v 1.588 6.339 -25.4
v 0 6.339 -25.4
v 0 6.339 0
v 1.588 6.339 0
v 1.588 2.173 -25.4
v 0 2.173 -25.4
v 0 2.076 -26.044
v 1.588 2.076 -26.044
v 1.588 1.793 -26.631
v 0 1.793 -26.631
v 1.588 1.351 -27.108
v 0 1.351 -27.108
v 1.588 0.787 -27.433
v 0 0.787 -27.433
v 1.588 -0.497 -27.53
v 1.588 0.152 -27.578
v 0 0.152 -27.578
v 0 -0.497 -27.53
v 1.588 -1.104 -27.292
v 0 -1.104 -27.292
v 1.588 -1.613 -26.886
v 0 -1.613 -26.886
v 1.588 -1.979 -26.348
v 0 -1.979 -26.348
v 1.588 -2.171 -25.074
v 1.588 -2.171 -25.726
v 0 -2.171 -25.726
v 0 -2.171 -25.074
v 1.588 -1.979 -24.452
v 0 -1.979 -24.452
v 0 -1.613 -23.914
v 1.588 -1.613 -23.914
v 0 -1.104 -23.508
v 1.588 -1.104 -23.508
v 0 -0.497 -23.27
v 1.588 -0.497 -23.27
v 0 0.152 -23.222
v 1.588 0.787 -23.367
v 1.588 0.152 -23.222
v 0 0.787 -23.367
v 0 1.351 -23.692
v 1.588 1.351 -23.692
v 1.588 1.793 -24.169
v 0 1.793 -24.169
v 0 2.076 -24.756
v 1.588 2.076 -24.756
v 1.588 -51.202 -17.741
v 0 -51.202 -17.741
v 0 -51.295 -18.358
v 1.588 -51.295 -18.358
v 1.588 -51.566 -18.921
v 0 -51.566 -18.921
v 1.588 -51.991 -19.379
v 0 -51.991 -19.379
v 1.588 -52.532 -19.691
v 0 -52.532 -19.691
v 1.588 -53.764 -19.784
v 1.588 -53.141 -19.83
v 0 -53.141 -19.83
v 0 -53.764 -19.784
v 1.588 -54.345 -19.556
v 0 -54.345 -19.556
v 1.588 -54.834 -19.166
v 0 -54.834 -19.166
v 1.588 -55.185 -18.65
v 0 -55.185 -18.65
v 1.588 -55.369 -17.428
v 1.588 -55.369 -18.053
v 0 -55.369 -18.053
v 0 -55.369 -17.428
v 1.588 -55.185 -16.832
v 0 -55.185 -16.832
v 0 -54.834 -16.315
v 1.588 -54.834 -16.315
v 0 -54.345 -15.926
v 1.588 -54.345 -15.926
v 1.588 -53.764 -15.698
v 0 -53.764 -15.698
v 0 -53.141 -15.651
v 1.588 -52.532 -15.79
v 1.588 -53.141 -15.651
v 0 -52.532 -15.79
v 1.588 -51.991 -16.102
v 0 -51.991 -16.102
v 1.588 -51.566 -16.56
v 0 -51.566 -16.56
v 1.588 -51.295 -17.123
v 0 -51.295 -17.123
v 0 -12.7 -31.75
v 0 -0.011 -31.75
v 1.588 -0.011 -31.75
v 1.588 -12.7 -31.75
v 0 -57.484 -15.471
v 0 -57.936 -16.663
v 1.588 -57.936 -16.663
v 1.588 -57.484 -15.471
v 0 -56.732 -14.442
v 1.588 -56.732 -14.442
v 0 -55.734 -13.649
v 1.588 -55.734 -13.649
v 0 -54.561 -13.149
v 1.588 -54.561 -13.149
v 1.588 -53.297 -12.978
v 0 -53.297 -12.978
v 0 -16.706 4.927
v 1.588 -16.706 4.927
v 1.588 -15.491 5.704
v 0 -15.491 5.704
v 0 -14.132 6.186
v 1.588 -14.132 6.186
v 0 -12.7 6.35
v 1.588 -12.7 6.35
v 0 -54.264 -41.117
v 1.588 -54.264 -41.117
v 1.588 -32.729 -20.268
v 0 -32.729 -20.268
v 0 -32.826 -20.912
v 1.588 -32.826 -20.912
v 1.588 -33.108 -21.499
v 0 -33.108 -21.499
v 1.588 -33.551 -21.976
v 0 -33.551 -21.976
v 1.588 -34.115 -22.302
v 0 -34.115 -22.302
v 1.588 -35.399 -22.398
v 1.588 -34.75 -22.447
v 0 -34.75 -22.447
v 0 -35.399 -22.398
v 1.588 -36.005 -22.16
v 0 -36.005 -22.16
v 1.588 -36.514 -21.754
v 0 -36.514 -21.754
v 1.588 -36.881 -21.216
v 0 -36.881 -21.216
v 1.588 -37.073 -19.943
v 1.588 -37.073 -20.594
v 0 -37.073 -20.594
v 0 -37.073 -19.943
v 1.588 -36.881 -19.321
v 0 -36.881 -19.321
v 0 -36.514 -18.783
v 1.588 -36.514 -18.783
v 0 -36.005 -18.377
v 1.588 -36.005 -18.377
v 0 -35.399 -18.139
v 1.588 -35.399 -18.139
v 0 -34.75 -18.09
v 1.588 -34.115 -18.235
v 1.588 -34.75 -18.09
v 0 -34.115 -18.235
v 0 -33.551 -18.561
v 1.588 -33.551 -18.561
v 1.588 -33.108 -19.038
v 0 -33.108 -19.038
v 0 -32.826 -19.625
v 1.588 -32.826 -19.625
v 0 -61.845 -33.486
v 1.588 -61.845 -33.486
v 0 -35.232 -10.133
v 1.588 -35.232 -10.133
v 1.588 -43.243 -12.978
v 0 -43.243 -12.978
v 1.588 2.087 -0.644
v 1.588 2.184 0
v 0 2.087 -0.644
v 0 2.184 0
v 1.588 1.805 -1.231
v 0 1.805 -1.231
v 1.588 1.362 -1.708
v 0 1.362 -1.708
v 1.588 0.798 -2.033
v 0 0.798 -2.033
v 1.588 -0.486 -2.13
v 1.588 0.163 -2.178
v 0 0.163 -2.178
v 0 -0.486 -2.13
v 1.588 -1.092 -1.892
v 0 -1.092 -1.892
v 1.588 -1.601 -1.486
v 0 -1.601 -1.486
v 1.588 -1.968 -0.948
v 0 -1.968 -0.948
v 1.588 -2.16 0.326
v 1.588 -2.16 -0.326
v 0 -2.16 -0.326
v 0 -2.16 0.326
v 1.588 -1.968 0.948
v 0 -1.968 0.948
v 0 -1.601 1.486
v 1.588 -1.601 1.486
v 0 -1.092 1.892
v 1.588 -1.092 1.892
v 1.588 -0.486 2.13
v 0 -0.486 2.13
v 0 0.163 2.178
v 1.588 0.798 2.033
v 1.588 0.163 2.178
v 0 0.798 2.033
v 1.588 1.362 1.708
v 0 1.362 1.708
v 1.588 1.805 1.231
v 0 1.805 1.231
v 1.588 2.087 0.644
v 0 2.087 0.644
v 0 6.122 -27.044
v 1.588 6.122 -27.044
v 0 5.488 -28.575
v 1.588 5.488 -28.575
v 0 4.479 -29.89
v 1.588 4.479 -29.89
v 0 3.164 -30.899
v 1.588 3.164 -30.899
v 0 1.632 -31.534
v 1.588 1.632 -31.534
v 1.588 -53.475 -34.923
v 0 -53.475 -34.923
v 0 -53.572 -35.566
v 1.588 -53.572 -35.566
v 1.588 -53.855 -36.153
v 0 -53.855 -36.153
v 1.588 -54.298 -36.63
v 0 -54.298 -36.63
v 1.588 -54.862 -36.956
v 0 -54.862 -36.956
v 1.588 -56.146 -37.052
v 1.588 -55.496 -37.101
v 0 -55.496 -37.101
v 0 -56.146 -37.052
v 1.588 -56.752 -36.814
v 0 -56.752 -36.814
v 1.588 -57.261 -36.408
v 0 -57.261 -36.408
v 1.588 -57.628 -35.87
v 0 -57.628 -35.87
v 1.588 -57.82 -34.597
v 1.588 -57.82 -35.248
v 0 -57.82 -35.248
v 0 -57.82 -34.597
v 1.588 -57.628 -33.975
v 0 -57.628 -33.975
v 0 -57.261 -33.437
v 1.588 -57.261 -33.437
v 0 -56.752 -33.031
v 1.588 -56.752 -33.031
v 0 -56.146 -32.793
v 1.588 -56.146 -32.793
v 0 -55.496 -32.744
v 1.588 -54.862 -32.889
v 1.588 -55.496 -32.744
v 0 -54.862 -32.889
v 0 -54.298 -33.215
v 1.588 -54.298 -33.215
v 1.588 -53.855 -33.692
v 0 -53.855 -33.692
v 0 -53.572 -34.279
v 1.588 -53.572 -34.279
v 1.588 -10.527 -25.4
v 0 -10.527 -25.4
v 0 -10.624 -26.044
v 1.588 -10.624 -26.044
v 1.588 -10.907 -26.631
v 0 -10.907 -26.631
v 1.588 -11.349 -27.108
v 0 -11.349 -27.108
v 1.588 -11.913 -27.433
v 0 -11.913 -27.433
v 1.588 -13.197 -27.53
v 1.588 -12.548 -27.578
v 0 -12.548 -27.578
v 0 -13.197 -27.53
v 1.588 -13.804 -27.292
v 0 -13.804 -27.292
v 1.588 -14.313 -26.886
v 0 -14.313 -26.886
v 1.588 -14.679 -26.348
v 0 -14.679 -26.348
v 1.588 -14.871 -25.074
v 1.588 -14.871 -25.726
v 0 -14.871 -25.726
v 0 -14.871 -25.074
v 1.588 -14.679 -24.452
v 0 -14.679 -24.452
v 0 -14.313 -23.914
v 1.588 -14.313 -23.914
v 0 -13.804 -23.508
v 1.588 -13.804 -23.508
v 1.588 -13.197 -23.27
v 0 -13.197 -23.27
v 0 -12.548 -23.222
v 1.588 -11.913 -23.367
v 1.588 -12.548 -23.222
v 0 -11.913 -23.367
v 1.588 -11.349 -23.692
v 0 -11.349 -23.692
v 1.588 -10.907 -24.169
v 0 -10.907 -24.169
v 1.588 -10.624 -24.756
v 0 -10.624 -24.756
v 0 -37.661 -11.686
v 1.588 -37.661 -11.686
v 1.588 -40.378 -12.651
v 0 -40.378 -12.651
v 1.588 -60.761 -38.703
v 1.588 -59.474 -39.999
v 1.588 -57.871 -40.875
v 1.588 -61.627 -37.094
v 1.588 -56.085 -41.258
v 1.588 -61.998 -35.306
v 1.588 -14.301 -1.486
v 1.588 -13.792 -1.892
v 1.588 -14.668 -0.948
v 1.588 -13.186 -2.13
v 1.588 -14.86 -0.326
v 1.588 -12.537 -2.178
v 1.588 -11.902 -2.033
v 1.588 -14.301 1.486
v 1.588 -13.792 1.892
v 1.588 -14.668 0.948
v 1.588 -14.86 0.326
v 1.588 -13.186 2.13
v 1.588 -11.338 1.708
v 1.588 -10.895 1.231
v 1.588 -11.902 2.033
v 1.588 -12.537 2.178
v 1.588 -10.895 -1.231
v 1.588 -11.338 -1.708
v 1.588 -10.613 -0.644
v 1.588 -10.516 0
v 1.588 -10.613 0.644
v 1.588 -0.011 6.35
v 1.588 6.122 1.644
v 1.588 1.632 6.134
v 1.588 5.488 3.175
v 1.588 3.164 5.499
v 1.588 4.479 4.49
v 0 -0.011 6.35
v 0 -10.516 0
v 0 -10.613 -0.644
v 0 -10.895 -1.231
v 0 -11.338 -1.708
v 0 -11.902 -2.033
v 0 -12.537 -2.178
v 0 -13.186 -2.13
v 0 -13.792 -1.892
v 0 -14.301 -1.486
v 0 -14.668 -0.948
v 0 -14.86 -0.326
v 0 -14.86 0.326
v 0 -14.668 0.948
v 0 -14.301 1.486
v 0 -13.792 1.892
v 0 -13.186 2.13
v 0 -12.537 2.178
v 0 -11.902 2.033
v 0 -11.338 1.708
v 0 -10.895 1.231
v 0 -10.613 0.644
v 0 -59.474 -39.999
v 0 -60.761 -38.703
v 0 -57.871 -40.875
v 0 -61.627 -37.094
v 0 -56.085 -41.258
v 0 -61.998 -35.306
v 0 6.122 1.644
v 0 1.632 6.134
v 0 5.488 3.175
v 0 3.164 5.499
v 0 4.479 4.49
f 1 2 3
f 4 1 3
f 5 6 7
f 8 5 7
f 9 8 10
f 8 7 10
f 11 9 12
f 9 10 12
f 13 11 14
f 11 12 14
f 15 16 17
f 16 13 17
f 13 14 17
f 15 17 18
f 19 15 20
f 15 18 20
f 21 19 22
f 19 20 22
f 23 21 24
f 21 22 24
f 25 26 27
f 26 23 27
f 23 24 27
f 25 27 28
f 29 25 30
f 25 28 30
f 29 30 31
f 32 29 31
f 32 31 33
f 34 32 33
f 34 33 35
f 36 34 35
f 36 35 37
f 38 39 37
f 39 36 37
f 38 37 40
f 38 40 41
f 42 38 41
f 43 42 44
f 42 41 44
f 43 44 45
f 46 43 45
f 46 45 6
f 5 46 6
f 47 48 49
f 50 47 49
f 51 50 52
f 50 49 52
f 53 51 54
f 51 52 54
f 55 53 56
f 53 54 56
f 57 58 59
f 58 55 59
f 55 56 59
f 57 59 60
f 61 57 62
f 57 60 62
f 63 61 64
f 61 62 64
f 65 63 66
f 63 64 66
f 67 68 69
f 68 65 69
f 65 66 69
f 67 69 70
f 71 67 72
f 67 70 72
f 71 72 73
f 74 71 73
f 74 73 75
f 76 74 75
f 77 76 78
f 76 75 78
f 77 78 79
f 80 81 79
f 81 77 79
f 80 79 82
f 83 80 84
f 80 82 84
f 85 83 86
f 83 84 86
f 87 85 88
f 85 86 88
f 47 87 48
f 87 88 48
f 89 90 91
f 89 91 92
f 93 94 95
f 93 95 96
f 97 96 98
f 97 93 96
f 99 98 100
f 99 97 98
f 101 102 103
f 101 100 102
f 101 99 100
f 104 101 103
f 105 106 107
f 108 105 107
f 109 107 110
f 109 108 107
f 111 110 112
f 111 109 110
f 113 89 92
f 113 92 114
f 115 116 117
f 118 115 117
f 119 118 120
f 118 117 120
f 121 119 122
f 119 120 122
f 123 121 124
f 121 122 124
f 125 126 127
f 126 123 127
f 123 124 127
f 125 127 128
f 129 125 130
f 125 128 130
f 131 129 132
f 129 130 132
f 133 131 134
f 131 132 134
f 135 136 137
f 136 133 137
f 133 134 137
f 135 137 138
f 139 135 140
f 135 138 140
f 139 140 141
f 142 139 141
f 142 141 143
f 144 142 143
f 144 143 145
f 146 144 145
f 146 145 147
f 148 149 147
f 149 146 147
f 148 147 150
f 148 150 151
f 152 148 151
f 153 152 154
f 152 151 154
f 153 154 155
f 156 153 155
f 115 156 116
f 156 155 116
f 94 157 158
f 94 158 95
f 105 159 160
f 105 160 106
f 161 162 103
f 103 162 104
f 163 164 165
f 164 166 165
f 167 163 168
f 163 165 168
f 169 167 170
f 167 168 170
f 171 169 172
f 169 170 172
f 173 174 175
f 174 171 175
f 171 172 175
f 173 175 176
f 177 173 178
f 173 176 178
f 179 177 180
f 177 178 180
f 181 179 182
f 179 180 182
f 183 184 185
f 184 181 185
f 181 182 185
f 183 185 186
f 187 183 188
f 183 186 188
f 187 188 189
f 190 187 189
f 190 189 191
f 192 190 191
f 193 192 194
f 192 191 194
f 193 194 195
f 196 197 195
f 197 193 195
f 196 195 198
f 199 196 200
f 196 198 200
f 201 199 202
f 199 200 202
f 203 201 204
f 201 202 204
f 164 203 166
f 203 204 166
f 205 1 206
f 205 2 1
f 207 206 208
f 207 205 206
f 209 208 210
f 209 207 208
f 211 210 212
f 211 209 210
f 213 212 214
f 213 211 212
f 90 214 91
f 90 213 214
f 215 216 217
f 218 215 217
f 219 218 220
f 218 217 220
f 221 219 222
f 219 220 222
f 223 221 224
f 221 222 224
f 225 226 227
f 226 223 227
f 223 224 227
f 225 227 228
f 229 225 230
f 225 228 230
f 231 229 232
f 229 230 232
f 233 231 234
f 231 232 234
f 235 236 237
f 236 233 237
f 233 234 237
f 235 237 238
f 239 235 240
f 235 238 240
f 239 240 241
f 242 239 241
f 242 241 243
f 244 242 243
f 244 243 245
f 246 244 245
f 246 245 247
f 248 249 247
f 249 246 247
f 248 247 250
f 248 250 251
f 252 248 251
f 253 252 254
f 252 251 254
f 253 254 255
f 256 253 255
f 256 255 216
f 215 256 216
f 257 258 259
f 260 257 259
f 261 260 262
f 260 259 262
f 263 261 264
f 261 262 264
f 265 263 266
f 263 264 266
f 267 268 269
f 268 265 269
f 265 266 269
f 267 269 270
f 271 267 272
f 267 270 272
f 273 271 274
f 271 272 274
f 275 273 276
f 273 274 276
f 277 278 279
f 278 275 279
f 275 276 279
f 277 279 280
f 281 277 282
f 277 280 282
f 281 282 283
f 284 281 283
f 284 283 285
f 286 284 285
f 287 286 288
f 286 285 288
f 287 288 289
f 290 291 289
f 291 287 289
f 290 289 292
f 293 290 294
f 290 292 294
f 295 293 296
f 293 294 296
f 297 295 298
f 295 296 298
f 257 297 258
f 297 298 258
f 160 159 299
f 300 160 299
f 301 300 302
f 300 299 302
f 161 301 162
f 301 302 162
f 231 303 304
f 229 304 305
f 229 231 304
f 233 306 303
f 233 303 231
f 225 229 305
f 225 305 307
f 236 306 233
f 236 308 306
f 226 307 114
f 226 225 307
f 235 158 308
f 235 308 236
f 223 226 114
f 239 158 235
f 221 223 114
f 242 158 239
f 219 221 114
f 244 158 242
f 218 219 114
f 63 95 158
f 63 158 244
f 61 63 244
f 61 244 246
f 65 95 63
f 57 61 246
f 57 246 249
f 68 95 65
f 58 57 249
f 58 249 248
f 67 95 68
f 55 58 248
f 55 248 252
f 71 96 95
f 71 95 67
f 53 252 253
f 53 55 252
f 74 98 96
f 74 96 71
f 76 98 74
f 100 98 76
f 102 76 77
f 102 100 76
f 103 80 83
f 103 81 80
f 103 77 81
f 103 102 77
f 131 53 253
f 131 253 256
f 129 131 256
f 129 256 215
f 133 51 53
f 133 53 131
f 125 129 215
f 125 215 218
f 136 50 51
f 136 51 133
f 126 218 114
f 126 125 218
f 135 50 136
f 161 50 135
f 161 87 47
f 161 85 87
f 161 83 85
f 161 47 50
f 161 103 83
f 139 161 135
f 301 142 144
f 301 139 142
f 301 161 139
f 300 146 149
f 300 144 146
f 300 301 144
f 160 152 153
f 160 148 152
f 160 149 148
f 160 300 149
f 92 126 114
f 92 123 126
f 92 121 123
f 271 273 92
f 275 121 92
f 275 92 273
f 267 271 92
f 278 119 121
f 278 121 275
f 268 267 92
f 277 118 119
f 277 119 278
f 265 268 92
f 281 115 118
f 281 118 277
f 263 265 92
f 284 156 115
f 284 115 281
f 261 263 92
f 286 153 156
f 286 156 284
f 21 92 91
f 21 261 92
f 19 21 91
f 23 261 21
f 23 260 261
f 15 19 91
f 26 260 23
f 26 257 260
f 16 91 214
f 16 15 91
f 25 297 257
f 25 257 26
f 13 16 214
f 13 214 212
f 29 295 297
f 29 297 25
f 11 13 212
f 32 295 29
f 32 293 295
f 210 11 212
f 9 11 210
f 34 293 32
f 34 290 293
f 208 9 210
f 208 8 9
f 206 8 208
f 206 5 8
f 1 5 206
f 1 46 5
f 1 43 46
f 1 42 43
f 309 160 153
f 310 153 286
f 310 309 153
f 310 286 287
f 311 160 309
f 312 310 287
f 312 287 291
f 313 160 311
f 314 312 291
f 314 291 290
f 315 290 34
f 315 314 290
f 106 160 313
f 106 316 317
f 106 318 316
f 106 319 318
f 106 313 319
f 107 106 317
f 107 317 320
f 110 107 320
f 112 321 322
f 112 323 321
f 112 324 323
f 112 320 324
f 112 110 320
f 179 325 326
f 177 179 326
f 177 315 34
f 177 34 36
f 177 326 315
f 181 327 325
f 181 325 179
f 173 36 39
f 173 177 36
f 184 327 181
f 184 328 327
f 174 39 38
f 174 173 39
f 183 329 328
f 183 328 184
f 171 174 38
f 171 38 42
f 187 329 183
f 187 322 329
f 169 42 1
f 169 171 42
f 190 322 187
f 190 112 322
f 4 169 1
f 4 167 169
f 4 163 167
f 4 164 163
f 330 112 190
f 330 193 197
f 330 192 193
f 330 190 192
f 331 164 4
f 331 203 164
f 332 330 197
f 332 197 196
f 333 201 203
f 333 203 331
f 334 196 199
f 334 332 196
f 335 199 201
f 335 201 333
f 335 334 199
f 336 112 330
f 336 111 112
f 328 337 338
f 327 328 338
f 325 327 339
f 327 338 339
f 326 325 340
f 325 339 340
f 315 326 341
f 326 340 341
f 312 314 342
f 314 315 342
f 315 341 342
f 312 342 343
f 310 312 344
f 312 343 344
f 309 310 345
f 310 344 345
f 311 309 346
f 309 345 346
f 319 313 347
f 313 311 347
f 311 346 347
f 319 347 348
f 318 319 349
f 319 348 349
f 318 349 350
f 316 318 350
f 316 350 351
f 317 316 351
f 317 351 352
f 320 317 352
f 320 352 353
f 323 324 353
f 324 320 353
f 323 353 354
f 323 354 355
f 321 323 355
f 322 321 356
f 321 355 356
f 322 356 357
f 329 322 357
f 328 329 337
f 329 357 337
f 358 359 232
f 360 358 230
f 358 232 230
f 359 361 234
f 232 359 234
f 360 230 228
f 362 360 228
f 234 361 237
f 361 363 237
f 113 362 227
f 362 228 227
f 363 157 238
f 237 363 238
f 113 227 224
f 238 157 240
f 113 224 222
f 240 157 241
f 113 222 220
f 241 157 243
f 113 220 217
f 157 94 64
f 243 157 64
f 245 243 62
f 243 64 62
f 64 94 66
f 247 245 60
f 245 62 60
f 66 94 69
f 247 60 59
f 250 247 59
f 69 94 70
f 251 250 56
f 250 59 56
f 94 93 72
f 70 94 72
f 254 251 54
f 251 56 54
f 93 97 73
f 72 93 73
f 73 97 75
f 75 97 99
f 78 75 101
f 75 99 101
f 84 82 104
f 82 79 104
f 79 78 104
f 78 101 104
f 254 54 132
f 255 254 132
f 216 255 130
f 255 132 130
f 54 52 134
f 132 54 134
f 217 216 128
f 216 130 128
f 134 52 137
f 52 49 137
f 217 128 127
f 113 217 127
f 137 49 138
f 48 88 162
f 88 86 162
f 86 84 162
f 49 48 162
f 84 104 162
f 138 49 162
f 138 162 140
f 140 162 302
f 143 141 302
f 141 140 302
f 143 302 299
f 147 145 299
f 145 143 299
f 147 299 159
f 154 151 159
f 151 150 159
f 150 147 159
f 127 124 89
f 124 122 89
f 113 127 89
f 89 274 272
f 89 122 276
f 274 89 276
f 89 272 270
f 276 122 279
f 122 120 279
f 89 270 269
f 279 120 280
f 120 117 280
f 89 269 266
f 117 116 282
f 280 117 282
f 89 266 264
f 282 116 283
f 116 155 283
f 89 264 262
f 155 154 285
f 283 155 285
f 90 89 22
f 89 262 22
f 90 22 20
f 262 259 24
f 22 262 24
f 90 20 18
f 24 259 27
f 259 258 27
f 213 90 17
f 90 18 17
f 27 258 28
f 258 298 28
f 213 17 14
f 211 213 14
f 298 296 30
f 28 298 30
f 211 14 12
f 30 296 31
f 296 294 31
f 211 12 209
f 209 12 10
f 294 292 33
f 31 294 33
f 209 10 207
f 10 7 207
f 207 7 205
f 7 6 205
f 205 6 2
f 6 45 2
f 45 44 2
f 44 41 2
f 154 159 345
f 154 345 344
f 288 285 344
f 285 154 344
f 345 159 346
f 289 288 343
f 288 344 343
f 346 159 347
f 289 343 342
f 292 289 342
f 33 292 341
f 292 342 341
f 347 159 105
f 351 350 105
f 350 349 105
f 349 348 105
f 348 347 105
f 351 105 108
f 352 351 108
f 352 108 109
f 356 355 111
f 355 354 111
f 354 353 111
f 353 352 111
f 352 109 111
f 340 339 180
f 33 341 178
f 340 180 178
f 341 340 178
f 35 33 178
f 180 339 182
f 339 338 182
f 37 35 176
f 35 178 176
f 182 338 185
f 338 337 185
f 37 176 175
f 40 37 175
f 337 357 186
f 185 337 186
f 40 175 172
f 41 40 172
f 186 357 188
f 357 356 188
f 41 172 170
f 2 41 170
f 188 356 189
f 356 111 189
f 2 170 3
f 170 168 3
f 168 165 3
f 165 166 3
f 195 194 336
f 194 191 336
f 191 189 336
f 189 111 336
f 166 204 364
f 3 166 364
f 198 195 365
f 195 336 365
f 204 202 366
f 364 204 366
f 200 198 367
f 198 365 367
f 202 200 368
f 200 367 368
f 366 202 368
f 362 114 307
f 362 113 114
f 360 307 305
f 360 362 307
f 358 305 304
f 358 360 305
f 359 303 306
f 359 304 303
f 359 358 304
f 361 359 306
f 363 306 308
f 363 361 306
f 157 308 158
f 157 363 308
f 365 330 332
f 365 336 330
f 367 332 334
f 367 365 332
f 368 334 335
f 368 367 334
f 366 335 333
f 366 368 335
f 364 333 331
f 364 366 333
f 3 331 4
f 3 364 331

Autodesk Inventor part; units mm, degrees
ref_plane "YZ Plane" through (0, 0, 0) normal (1, 0, 0) x (0, 1, 0)
ref_plane "XZ Plane" through (0, 0, 0) normal (0, 1, 0) x (-1, 0, 0)
ref_plane "XY Plane" through (0, 0, 0) normal (0, 0, 1) x (1, 0, 0)
sketch "maiin" plane through (0, 0, 0) normal (0, 0, 1) x (1, 0, 0)
  circle A0 centre (-6.5018, 3.4753) radius 2.1844
  line L0 (-6.8203, 13.6107) -> (11.7059, 28.671)
  circle A1 centre (-27.2482, -11.1789) radius 2.1844
  arc A2 (-33.4335, -9.7418) -> (-25.8521, -17.3735) centre (-27.2482, -11.1789) ccw
  line L1 (34.75, -1.6563) -> (34.75, 23.7437)
  line L2 (15.7114, 30.0937) -> (28.4, 30.0937)
  circle A3 centre (28.4114, 23.7437) radius 2.1844
  circle A4 centre (28.4, -1.6563) radius 2.1844
  circle A5 centre (15.7114, 23.7437) radius 2.1844
  circle A6 centre (15.7, -1.6563) radius 2.1844
  arc A7 (34.75, 23.7437) -> (28.4, 30.0937) centre (28.4, 23.7437) ccw
  arc A8 (15.7114, 30.0937) -> (11.7059, 28.671) centre (15.7114, 23.7437) ccw
  arc A9 (28.4, -8.0063) -> (34.75, -1.6563) centre (28.4, -1.6563) ccw
  line L3 (28.4, -8.0063) -> (15.7114, -8.0063)
  line L4 (15.7114, -8.0063) -> (-25.8521, -17.3735)
  circle A10 centre (-24.886, 6.0028) radius 2.0955
  arc A11 (-24.886, 10.7653) -> (-29.5249, 7.0806) centre (-24.886, 6.0028) ccw
  line L5 (-33.4335, -9.7418) -> (-29.5249, 7.0806)
  line L6 (-14.8313, 10.7653) -> (-24.886, 10.7653)
  arc A12 (-14.8313, 10.7653) -> (-6.8203, 13.6107) centre (-14.8313, 23.4653) ccw
  point P0 (10.0881, 4.3711)
  point P1 (32.8902, 28.2338)
  dimension "d0" = 12.7
  dimension "d6" = 4.3688
  dimension "d9" = 12.7
  dimension "d10" = 25.4
  dimension "d11" = 12.7
  dimension "d12" = 25.4
  dimension "d14" = 4.191
  dimension "d15" = 9.525
  dimension "d16" = 12.7
sketch "Sketch1" plane through (0, 0, 0) normal (1, 0, 0) x (0, 1, 0)
  circle A0 centre (-34.9132, -20.2684) radius 2.1844
  line L0 (-35.2318, -10.133) -> (-16.7055, 4.9273)
  circle A1 centre (-55.6596, -34.9226) radius 2.1844
  arc A2 (-61.8449, -33.4855) -> (-54.2635, -41.1172) centre (-55.6596, -34.9226) ccw
  line L1 (6.3386, -25.4) -> (6.3386, 0)
  line L2 (-12.7, 6.35) -> (-0.0114, 6.35)
  circle A3 centre (0, 0) radius 2.1844
  circle A4 centre (-0.0114, -25.4) radius 2.1844
  circle A5 centre (-12.7, 0) radius 2.1844
  circle A6 centre (-12.7114, -25.4) radius 2.1844
  arc A7 (6.3386, 0) -> (-0.0114, 6.35) centre (-0.0114, 0) ccw
  arc A8 (-12.7, 6.35) -> (-16.7055, 4.9273) centre (-12.7, 0) ccw
  arc A9 (-0.0114, -31.75) -> (6.3386, -25.4) centre (-0.0114, -25.4) ccw
  line L3 (-0.0114, -31.75) -> (-12.7, -31.75)
  line L4 (-12.7, -31.75) -> (-54.2635, -41.1172)
  circle A10 centre (-53.2974, -17.7408) radius 2.0955
  arc A11 (-53.2974, -12.9783) -> (-57.9364, -16.663) centre (-53.2974, -17.7408) ccw
  line L5 (-61.8449, -33.4855) -> (-57.9364, -16.663)
  line L6 (-43.2428, -12.9783) -> (-53.2974, -12.9783)
  arc A12 (-43.2428, -12.9783) -> (-35.2318, -10.133) centre (-43.2428, -0.2783) ccw
extrude "Extrusion1" add sketch "Sketch1" along normal blind 1.5875
properties part number "Angle Brace Gusset" material "Acetal Resin, White"
